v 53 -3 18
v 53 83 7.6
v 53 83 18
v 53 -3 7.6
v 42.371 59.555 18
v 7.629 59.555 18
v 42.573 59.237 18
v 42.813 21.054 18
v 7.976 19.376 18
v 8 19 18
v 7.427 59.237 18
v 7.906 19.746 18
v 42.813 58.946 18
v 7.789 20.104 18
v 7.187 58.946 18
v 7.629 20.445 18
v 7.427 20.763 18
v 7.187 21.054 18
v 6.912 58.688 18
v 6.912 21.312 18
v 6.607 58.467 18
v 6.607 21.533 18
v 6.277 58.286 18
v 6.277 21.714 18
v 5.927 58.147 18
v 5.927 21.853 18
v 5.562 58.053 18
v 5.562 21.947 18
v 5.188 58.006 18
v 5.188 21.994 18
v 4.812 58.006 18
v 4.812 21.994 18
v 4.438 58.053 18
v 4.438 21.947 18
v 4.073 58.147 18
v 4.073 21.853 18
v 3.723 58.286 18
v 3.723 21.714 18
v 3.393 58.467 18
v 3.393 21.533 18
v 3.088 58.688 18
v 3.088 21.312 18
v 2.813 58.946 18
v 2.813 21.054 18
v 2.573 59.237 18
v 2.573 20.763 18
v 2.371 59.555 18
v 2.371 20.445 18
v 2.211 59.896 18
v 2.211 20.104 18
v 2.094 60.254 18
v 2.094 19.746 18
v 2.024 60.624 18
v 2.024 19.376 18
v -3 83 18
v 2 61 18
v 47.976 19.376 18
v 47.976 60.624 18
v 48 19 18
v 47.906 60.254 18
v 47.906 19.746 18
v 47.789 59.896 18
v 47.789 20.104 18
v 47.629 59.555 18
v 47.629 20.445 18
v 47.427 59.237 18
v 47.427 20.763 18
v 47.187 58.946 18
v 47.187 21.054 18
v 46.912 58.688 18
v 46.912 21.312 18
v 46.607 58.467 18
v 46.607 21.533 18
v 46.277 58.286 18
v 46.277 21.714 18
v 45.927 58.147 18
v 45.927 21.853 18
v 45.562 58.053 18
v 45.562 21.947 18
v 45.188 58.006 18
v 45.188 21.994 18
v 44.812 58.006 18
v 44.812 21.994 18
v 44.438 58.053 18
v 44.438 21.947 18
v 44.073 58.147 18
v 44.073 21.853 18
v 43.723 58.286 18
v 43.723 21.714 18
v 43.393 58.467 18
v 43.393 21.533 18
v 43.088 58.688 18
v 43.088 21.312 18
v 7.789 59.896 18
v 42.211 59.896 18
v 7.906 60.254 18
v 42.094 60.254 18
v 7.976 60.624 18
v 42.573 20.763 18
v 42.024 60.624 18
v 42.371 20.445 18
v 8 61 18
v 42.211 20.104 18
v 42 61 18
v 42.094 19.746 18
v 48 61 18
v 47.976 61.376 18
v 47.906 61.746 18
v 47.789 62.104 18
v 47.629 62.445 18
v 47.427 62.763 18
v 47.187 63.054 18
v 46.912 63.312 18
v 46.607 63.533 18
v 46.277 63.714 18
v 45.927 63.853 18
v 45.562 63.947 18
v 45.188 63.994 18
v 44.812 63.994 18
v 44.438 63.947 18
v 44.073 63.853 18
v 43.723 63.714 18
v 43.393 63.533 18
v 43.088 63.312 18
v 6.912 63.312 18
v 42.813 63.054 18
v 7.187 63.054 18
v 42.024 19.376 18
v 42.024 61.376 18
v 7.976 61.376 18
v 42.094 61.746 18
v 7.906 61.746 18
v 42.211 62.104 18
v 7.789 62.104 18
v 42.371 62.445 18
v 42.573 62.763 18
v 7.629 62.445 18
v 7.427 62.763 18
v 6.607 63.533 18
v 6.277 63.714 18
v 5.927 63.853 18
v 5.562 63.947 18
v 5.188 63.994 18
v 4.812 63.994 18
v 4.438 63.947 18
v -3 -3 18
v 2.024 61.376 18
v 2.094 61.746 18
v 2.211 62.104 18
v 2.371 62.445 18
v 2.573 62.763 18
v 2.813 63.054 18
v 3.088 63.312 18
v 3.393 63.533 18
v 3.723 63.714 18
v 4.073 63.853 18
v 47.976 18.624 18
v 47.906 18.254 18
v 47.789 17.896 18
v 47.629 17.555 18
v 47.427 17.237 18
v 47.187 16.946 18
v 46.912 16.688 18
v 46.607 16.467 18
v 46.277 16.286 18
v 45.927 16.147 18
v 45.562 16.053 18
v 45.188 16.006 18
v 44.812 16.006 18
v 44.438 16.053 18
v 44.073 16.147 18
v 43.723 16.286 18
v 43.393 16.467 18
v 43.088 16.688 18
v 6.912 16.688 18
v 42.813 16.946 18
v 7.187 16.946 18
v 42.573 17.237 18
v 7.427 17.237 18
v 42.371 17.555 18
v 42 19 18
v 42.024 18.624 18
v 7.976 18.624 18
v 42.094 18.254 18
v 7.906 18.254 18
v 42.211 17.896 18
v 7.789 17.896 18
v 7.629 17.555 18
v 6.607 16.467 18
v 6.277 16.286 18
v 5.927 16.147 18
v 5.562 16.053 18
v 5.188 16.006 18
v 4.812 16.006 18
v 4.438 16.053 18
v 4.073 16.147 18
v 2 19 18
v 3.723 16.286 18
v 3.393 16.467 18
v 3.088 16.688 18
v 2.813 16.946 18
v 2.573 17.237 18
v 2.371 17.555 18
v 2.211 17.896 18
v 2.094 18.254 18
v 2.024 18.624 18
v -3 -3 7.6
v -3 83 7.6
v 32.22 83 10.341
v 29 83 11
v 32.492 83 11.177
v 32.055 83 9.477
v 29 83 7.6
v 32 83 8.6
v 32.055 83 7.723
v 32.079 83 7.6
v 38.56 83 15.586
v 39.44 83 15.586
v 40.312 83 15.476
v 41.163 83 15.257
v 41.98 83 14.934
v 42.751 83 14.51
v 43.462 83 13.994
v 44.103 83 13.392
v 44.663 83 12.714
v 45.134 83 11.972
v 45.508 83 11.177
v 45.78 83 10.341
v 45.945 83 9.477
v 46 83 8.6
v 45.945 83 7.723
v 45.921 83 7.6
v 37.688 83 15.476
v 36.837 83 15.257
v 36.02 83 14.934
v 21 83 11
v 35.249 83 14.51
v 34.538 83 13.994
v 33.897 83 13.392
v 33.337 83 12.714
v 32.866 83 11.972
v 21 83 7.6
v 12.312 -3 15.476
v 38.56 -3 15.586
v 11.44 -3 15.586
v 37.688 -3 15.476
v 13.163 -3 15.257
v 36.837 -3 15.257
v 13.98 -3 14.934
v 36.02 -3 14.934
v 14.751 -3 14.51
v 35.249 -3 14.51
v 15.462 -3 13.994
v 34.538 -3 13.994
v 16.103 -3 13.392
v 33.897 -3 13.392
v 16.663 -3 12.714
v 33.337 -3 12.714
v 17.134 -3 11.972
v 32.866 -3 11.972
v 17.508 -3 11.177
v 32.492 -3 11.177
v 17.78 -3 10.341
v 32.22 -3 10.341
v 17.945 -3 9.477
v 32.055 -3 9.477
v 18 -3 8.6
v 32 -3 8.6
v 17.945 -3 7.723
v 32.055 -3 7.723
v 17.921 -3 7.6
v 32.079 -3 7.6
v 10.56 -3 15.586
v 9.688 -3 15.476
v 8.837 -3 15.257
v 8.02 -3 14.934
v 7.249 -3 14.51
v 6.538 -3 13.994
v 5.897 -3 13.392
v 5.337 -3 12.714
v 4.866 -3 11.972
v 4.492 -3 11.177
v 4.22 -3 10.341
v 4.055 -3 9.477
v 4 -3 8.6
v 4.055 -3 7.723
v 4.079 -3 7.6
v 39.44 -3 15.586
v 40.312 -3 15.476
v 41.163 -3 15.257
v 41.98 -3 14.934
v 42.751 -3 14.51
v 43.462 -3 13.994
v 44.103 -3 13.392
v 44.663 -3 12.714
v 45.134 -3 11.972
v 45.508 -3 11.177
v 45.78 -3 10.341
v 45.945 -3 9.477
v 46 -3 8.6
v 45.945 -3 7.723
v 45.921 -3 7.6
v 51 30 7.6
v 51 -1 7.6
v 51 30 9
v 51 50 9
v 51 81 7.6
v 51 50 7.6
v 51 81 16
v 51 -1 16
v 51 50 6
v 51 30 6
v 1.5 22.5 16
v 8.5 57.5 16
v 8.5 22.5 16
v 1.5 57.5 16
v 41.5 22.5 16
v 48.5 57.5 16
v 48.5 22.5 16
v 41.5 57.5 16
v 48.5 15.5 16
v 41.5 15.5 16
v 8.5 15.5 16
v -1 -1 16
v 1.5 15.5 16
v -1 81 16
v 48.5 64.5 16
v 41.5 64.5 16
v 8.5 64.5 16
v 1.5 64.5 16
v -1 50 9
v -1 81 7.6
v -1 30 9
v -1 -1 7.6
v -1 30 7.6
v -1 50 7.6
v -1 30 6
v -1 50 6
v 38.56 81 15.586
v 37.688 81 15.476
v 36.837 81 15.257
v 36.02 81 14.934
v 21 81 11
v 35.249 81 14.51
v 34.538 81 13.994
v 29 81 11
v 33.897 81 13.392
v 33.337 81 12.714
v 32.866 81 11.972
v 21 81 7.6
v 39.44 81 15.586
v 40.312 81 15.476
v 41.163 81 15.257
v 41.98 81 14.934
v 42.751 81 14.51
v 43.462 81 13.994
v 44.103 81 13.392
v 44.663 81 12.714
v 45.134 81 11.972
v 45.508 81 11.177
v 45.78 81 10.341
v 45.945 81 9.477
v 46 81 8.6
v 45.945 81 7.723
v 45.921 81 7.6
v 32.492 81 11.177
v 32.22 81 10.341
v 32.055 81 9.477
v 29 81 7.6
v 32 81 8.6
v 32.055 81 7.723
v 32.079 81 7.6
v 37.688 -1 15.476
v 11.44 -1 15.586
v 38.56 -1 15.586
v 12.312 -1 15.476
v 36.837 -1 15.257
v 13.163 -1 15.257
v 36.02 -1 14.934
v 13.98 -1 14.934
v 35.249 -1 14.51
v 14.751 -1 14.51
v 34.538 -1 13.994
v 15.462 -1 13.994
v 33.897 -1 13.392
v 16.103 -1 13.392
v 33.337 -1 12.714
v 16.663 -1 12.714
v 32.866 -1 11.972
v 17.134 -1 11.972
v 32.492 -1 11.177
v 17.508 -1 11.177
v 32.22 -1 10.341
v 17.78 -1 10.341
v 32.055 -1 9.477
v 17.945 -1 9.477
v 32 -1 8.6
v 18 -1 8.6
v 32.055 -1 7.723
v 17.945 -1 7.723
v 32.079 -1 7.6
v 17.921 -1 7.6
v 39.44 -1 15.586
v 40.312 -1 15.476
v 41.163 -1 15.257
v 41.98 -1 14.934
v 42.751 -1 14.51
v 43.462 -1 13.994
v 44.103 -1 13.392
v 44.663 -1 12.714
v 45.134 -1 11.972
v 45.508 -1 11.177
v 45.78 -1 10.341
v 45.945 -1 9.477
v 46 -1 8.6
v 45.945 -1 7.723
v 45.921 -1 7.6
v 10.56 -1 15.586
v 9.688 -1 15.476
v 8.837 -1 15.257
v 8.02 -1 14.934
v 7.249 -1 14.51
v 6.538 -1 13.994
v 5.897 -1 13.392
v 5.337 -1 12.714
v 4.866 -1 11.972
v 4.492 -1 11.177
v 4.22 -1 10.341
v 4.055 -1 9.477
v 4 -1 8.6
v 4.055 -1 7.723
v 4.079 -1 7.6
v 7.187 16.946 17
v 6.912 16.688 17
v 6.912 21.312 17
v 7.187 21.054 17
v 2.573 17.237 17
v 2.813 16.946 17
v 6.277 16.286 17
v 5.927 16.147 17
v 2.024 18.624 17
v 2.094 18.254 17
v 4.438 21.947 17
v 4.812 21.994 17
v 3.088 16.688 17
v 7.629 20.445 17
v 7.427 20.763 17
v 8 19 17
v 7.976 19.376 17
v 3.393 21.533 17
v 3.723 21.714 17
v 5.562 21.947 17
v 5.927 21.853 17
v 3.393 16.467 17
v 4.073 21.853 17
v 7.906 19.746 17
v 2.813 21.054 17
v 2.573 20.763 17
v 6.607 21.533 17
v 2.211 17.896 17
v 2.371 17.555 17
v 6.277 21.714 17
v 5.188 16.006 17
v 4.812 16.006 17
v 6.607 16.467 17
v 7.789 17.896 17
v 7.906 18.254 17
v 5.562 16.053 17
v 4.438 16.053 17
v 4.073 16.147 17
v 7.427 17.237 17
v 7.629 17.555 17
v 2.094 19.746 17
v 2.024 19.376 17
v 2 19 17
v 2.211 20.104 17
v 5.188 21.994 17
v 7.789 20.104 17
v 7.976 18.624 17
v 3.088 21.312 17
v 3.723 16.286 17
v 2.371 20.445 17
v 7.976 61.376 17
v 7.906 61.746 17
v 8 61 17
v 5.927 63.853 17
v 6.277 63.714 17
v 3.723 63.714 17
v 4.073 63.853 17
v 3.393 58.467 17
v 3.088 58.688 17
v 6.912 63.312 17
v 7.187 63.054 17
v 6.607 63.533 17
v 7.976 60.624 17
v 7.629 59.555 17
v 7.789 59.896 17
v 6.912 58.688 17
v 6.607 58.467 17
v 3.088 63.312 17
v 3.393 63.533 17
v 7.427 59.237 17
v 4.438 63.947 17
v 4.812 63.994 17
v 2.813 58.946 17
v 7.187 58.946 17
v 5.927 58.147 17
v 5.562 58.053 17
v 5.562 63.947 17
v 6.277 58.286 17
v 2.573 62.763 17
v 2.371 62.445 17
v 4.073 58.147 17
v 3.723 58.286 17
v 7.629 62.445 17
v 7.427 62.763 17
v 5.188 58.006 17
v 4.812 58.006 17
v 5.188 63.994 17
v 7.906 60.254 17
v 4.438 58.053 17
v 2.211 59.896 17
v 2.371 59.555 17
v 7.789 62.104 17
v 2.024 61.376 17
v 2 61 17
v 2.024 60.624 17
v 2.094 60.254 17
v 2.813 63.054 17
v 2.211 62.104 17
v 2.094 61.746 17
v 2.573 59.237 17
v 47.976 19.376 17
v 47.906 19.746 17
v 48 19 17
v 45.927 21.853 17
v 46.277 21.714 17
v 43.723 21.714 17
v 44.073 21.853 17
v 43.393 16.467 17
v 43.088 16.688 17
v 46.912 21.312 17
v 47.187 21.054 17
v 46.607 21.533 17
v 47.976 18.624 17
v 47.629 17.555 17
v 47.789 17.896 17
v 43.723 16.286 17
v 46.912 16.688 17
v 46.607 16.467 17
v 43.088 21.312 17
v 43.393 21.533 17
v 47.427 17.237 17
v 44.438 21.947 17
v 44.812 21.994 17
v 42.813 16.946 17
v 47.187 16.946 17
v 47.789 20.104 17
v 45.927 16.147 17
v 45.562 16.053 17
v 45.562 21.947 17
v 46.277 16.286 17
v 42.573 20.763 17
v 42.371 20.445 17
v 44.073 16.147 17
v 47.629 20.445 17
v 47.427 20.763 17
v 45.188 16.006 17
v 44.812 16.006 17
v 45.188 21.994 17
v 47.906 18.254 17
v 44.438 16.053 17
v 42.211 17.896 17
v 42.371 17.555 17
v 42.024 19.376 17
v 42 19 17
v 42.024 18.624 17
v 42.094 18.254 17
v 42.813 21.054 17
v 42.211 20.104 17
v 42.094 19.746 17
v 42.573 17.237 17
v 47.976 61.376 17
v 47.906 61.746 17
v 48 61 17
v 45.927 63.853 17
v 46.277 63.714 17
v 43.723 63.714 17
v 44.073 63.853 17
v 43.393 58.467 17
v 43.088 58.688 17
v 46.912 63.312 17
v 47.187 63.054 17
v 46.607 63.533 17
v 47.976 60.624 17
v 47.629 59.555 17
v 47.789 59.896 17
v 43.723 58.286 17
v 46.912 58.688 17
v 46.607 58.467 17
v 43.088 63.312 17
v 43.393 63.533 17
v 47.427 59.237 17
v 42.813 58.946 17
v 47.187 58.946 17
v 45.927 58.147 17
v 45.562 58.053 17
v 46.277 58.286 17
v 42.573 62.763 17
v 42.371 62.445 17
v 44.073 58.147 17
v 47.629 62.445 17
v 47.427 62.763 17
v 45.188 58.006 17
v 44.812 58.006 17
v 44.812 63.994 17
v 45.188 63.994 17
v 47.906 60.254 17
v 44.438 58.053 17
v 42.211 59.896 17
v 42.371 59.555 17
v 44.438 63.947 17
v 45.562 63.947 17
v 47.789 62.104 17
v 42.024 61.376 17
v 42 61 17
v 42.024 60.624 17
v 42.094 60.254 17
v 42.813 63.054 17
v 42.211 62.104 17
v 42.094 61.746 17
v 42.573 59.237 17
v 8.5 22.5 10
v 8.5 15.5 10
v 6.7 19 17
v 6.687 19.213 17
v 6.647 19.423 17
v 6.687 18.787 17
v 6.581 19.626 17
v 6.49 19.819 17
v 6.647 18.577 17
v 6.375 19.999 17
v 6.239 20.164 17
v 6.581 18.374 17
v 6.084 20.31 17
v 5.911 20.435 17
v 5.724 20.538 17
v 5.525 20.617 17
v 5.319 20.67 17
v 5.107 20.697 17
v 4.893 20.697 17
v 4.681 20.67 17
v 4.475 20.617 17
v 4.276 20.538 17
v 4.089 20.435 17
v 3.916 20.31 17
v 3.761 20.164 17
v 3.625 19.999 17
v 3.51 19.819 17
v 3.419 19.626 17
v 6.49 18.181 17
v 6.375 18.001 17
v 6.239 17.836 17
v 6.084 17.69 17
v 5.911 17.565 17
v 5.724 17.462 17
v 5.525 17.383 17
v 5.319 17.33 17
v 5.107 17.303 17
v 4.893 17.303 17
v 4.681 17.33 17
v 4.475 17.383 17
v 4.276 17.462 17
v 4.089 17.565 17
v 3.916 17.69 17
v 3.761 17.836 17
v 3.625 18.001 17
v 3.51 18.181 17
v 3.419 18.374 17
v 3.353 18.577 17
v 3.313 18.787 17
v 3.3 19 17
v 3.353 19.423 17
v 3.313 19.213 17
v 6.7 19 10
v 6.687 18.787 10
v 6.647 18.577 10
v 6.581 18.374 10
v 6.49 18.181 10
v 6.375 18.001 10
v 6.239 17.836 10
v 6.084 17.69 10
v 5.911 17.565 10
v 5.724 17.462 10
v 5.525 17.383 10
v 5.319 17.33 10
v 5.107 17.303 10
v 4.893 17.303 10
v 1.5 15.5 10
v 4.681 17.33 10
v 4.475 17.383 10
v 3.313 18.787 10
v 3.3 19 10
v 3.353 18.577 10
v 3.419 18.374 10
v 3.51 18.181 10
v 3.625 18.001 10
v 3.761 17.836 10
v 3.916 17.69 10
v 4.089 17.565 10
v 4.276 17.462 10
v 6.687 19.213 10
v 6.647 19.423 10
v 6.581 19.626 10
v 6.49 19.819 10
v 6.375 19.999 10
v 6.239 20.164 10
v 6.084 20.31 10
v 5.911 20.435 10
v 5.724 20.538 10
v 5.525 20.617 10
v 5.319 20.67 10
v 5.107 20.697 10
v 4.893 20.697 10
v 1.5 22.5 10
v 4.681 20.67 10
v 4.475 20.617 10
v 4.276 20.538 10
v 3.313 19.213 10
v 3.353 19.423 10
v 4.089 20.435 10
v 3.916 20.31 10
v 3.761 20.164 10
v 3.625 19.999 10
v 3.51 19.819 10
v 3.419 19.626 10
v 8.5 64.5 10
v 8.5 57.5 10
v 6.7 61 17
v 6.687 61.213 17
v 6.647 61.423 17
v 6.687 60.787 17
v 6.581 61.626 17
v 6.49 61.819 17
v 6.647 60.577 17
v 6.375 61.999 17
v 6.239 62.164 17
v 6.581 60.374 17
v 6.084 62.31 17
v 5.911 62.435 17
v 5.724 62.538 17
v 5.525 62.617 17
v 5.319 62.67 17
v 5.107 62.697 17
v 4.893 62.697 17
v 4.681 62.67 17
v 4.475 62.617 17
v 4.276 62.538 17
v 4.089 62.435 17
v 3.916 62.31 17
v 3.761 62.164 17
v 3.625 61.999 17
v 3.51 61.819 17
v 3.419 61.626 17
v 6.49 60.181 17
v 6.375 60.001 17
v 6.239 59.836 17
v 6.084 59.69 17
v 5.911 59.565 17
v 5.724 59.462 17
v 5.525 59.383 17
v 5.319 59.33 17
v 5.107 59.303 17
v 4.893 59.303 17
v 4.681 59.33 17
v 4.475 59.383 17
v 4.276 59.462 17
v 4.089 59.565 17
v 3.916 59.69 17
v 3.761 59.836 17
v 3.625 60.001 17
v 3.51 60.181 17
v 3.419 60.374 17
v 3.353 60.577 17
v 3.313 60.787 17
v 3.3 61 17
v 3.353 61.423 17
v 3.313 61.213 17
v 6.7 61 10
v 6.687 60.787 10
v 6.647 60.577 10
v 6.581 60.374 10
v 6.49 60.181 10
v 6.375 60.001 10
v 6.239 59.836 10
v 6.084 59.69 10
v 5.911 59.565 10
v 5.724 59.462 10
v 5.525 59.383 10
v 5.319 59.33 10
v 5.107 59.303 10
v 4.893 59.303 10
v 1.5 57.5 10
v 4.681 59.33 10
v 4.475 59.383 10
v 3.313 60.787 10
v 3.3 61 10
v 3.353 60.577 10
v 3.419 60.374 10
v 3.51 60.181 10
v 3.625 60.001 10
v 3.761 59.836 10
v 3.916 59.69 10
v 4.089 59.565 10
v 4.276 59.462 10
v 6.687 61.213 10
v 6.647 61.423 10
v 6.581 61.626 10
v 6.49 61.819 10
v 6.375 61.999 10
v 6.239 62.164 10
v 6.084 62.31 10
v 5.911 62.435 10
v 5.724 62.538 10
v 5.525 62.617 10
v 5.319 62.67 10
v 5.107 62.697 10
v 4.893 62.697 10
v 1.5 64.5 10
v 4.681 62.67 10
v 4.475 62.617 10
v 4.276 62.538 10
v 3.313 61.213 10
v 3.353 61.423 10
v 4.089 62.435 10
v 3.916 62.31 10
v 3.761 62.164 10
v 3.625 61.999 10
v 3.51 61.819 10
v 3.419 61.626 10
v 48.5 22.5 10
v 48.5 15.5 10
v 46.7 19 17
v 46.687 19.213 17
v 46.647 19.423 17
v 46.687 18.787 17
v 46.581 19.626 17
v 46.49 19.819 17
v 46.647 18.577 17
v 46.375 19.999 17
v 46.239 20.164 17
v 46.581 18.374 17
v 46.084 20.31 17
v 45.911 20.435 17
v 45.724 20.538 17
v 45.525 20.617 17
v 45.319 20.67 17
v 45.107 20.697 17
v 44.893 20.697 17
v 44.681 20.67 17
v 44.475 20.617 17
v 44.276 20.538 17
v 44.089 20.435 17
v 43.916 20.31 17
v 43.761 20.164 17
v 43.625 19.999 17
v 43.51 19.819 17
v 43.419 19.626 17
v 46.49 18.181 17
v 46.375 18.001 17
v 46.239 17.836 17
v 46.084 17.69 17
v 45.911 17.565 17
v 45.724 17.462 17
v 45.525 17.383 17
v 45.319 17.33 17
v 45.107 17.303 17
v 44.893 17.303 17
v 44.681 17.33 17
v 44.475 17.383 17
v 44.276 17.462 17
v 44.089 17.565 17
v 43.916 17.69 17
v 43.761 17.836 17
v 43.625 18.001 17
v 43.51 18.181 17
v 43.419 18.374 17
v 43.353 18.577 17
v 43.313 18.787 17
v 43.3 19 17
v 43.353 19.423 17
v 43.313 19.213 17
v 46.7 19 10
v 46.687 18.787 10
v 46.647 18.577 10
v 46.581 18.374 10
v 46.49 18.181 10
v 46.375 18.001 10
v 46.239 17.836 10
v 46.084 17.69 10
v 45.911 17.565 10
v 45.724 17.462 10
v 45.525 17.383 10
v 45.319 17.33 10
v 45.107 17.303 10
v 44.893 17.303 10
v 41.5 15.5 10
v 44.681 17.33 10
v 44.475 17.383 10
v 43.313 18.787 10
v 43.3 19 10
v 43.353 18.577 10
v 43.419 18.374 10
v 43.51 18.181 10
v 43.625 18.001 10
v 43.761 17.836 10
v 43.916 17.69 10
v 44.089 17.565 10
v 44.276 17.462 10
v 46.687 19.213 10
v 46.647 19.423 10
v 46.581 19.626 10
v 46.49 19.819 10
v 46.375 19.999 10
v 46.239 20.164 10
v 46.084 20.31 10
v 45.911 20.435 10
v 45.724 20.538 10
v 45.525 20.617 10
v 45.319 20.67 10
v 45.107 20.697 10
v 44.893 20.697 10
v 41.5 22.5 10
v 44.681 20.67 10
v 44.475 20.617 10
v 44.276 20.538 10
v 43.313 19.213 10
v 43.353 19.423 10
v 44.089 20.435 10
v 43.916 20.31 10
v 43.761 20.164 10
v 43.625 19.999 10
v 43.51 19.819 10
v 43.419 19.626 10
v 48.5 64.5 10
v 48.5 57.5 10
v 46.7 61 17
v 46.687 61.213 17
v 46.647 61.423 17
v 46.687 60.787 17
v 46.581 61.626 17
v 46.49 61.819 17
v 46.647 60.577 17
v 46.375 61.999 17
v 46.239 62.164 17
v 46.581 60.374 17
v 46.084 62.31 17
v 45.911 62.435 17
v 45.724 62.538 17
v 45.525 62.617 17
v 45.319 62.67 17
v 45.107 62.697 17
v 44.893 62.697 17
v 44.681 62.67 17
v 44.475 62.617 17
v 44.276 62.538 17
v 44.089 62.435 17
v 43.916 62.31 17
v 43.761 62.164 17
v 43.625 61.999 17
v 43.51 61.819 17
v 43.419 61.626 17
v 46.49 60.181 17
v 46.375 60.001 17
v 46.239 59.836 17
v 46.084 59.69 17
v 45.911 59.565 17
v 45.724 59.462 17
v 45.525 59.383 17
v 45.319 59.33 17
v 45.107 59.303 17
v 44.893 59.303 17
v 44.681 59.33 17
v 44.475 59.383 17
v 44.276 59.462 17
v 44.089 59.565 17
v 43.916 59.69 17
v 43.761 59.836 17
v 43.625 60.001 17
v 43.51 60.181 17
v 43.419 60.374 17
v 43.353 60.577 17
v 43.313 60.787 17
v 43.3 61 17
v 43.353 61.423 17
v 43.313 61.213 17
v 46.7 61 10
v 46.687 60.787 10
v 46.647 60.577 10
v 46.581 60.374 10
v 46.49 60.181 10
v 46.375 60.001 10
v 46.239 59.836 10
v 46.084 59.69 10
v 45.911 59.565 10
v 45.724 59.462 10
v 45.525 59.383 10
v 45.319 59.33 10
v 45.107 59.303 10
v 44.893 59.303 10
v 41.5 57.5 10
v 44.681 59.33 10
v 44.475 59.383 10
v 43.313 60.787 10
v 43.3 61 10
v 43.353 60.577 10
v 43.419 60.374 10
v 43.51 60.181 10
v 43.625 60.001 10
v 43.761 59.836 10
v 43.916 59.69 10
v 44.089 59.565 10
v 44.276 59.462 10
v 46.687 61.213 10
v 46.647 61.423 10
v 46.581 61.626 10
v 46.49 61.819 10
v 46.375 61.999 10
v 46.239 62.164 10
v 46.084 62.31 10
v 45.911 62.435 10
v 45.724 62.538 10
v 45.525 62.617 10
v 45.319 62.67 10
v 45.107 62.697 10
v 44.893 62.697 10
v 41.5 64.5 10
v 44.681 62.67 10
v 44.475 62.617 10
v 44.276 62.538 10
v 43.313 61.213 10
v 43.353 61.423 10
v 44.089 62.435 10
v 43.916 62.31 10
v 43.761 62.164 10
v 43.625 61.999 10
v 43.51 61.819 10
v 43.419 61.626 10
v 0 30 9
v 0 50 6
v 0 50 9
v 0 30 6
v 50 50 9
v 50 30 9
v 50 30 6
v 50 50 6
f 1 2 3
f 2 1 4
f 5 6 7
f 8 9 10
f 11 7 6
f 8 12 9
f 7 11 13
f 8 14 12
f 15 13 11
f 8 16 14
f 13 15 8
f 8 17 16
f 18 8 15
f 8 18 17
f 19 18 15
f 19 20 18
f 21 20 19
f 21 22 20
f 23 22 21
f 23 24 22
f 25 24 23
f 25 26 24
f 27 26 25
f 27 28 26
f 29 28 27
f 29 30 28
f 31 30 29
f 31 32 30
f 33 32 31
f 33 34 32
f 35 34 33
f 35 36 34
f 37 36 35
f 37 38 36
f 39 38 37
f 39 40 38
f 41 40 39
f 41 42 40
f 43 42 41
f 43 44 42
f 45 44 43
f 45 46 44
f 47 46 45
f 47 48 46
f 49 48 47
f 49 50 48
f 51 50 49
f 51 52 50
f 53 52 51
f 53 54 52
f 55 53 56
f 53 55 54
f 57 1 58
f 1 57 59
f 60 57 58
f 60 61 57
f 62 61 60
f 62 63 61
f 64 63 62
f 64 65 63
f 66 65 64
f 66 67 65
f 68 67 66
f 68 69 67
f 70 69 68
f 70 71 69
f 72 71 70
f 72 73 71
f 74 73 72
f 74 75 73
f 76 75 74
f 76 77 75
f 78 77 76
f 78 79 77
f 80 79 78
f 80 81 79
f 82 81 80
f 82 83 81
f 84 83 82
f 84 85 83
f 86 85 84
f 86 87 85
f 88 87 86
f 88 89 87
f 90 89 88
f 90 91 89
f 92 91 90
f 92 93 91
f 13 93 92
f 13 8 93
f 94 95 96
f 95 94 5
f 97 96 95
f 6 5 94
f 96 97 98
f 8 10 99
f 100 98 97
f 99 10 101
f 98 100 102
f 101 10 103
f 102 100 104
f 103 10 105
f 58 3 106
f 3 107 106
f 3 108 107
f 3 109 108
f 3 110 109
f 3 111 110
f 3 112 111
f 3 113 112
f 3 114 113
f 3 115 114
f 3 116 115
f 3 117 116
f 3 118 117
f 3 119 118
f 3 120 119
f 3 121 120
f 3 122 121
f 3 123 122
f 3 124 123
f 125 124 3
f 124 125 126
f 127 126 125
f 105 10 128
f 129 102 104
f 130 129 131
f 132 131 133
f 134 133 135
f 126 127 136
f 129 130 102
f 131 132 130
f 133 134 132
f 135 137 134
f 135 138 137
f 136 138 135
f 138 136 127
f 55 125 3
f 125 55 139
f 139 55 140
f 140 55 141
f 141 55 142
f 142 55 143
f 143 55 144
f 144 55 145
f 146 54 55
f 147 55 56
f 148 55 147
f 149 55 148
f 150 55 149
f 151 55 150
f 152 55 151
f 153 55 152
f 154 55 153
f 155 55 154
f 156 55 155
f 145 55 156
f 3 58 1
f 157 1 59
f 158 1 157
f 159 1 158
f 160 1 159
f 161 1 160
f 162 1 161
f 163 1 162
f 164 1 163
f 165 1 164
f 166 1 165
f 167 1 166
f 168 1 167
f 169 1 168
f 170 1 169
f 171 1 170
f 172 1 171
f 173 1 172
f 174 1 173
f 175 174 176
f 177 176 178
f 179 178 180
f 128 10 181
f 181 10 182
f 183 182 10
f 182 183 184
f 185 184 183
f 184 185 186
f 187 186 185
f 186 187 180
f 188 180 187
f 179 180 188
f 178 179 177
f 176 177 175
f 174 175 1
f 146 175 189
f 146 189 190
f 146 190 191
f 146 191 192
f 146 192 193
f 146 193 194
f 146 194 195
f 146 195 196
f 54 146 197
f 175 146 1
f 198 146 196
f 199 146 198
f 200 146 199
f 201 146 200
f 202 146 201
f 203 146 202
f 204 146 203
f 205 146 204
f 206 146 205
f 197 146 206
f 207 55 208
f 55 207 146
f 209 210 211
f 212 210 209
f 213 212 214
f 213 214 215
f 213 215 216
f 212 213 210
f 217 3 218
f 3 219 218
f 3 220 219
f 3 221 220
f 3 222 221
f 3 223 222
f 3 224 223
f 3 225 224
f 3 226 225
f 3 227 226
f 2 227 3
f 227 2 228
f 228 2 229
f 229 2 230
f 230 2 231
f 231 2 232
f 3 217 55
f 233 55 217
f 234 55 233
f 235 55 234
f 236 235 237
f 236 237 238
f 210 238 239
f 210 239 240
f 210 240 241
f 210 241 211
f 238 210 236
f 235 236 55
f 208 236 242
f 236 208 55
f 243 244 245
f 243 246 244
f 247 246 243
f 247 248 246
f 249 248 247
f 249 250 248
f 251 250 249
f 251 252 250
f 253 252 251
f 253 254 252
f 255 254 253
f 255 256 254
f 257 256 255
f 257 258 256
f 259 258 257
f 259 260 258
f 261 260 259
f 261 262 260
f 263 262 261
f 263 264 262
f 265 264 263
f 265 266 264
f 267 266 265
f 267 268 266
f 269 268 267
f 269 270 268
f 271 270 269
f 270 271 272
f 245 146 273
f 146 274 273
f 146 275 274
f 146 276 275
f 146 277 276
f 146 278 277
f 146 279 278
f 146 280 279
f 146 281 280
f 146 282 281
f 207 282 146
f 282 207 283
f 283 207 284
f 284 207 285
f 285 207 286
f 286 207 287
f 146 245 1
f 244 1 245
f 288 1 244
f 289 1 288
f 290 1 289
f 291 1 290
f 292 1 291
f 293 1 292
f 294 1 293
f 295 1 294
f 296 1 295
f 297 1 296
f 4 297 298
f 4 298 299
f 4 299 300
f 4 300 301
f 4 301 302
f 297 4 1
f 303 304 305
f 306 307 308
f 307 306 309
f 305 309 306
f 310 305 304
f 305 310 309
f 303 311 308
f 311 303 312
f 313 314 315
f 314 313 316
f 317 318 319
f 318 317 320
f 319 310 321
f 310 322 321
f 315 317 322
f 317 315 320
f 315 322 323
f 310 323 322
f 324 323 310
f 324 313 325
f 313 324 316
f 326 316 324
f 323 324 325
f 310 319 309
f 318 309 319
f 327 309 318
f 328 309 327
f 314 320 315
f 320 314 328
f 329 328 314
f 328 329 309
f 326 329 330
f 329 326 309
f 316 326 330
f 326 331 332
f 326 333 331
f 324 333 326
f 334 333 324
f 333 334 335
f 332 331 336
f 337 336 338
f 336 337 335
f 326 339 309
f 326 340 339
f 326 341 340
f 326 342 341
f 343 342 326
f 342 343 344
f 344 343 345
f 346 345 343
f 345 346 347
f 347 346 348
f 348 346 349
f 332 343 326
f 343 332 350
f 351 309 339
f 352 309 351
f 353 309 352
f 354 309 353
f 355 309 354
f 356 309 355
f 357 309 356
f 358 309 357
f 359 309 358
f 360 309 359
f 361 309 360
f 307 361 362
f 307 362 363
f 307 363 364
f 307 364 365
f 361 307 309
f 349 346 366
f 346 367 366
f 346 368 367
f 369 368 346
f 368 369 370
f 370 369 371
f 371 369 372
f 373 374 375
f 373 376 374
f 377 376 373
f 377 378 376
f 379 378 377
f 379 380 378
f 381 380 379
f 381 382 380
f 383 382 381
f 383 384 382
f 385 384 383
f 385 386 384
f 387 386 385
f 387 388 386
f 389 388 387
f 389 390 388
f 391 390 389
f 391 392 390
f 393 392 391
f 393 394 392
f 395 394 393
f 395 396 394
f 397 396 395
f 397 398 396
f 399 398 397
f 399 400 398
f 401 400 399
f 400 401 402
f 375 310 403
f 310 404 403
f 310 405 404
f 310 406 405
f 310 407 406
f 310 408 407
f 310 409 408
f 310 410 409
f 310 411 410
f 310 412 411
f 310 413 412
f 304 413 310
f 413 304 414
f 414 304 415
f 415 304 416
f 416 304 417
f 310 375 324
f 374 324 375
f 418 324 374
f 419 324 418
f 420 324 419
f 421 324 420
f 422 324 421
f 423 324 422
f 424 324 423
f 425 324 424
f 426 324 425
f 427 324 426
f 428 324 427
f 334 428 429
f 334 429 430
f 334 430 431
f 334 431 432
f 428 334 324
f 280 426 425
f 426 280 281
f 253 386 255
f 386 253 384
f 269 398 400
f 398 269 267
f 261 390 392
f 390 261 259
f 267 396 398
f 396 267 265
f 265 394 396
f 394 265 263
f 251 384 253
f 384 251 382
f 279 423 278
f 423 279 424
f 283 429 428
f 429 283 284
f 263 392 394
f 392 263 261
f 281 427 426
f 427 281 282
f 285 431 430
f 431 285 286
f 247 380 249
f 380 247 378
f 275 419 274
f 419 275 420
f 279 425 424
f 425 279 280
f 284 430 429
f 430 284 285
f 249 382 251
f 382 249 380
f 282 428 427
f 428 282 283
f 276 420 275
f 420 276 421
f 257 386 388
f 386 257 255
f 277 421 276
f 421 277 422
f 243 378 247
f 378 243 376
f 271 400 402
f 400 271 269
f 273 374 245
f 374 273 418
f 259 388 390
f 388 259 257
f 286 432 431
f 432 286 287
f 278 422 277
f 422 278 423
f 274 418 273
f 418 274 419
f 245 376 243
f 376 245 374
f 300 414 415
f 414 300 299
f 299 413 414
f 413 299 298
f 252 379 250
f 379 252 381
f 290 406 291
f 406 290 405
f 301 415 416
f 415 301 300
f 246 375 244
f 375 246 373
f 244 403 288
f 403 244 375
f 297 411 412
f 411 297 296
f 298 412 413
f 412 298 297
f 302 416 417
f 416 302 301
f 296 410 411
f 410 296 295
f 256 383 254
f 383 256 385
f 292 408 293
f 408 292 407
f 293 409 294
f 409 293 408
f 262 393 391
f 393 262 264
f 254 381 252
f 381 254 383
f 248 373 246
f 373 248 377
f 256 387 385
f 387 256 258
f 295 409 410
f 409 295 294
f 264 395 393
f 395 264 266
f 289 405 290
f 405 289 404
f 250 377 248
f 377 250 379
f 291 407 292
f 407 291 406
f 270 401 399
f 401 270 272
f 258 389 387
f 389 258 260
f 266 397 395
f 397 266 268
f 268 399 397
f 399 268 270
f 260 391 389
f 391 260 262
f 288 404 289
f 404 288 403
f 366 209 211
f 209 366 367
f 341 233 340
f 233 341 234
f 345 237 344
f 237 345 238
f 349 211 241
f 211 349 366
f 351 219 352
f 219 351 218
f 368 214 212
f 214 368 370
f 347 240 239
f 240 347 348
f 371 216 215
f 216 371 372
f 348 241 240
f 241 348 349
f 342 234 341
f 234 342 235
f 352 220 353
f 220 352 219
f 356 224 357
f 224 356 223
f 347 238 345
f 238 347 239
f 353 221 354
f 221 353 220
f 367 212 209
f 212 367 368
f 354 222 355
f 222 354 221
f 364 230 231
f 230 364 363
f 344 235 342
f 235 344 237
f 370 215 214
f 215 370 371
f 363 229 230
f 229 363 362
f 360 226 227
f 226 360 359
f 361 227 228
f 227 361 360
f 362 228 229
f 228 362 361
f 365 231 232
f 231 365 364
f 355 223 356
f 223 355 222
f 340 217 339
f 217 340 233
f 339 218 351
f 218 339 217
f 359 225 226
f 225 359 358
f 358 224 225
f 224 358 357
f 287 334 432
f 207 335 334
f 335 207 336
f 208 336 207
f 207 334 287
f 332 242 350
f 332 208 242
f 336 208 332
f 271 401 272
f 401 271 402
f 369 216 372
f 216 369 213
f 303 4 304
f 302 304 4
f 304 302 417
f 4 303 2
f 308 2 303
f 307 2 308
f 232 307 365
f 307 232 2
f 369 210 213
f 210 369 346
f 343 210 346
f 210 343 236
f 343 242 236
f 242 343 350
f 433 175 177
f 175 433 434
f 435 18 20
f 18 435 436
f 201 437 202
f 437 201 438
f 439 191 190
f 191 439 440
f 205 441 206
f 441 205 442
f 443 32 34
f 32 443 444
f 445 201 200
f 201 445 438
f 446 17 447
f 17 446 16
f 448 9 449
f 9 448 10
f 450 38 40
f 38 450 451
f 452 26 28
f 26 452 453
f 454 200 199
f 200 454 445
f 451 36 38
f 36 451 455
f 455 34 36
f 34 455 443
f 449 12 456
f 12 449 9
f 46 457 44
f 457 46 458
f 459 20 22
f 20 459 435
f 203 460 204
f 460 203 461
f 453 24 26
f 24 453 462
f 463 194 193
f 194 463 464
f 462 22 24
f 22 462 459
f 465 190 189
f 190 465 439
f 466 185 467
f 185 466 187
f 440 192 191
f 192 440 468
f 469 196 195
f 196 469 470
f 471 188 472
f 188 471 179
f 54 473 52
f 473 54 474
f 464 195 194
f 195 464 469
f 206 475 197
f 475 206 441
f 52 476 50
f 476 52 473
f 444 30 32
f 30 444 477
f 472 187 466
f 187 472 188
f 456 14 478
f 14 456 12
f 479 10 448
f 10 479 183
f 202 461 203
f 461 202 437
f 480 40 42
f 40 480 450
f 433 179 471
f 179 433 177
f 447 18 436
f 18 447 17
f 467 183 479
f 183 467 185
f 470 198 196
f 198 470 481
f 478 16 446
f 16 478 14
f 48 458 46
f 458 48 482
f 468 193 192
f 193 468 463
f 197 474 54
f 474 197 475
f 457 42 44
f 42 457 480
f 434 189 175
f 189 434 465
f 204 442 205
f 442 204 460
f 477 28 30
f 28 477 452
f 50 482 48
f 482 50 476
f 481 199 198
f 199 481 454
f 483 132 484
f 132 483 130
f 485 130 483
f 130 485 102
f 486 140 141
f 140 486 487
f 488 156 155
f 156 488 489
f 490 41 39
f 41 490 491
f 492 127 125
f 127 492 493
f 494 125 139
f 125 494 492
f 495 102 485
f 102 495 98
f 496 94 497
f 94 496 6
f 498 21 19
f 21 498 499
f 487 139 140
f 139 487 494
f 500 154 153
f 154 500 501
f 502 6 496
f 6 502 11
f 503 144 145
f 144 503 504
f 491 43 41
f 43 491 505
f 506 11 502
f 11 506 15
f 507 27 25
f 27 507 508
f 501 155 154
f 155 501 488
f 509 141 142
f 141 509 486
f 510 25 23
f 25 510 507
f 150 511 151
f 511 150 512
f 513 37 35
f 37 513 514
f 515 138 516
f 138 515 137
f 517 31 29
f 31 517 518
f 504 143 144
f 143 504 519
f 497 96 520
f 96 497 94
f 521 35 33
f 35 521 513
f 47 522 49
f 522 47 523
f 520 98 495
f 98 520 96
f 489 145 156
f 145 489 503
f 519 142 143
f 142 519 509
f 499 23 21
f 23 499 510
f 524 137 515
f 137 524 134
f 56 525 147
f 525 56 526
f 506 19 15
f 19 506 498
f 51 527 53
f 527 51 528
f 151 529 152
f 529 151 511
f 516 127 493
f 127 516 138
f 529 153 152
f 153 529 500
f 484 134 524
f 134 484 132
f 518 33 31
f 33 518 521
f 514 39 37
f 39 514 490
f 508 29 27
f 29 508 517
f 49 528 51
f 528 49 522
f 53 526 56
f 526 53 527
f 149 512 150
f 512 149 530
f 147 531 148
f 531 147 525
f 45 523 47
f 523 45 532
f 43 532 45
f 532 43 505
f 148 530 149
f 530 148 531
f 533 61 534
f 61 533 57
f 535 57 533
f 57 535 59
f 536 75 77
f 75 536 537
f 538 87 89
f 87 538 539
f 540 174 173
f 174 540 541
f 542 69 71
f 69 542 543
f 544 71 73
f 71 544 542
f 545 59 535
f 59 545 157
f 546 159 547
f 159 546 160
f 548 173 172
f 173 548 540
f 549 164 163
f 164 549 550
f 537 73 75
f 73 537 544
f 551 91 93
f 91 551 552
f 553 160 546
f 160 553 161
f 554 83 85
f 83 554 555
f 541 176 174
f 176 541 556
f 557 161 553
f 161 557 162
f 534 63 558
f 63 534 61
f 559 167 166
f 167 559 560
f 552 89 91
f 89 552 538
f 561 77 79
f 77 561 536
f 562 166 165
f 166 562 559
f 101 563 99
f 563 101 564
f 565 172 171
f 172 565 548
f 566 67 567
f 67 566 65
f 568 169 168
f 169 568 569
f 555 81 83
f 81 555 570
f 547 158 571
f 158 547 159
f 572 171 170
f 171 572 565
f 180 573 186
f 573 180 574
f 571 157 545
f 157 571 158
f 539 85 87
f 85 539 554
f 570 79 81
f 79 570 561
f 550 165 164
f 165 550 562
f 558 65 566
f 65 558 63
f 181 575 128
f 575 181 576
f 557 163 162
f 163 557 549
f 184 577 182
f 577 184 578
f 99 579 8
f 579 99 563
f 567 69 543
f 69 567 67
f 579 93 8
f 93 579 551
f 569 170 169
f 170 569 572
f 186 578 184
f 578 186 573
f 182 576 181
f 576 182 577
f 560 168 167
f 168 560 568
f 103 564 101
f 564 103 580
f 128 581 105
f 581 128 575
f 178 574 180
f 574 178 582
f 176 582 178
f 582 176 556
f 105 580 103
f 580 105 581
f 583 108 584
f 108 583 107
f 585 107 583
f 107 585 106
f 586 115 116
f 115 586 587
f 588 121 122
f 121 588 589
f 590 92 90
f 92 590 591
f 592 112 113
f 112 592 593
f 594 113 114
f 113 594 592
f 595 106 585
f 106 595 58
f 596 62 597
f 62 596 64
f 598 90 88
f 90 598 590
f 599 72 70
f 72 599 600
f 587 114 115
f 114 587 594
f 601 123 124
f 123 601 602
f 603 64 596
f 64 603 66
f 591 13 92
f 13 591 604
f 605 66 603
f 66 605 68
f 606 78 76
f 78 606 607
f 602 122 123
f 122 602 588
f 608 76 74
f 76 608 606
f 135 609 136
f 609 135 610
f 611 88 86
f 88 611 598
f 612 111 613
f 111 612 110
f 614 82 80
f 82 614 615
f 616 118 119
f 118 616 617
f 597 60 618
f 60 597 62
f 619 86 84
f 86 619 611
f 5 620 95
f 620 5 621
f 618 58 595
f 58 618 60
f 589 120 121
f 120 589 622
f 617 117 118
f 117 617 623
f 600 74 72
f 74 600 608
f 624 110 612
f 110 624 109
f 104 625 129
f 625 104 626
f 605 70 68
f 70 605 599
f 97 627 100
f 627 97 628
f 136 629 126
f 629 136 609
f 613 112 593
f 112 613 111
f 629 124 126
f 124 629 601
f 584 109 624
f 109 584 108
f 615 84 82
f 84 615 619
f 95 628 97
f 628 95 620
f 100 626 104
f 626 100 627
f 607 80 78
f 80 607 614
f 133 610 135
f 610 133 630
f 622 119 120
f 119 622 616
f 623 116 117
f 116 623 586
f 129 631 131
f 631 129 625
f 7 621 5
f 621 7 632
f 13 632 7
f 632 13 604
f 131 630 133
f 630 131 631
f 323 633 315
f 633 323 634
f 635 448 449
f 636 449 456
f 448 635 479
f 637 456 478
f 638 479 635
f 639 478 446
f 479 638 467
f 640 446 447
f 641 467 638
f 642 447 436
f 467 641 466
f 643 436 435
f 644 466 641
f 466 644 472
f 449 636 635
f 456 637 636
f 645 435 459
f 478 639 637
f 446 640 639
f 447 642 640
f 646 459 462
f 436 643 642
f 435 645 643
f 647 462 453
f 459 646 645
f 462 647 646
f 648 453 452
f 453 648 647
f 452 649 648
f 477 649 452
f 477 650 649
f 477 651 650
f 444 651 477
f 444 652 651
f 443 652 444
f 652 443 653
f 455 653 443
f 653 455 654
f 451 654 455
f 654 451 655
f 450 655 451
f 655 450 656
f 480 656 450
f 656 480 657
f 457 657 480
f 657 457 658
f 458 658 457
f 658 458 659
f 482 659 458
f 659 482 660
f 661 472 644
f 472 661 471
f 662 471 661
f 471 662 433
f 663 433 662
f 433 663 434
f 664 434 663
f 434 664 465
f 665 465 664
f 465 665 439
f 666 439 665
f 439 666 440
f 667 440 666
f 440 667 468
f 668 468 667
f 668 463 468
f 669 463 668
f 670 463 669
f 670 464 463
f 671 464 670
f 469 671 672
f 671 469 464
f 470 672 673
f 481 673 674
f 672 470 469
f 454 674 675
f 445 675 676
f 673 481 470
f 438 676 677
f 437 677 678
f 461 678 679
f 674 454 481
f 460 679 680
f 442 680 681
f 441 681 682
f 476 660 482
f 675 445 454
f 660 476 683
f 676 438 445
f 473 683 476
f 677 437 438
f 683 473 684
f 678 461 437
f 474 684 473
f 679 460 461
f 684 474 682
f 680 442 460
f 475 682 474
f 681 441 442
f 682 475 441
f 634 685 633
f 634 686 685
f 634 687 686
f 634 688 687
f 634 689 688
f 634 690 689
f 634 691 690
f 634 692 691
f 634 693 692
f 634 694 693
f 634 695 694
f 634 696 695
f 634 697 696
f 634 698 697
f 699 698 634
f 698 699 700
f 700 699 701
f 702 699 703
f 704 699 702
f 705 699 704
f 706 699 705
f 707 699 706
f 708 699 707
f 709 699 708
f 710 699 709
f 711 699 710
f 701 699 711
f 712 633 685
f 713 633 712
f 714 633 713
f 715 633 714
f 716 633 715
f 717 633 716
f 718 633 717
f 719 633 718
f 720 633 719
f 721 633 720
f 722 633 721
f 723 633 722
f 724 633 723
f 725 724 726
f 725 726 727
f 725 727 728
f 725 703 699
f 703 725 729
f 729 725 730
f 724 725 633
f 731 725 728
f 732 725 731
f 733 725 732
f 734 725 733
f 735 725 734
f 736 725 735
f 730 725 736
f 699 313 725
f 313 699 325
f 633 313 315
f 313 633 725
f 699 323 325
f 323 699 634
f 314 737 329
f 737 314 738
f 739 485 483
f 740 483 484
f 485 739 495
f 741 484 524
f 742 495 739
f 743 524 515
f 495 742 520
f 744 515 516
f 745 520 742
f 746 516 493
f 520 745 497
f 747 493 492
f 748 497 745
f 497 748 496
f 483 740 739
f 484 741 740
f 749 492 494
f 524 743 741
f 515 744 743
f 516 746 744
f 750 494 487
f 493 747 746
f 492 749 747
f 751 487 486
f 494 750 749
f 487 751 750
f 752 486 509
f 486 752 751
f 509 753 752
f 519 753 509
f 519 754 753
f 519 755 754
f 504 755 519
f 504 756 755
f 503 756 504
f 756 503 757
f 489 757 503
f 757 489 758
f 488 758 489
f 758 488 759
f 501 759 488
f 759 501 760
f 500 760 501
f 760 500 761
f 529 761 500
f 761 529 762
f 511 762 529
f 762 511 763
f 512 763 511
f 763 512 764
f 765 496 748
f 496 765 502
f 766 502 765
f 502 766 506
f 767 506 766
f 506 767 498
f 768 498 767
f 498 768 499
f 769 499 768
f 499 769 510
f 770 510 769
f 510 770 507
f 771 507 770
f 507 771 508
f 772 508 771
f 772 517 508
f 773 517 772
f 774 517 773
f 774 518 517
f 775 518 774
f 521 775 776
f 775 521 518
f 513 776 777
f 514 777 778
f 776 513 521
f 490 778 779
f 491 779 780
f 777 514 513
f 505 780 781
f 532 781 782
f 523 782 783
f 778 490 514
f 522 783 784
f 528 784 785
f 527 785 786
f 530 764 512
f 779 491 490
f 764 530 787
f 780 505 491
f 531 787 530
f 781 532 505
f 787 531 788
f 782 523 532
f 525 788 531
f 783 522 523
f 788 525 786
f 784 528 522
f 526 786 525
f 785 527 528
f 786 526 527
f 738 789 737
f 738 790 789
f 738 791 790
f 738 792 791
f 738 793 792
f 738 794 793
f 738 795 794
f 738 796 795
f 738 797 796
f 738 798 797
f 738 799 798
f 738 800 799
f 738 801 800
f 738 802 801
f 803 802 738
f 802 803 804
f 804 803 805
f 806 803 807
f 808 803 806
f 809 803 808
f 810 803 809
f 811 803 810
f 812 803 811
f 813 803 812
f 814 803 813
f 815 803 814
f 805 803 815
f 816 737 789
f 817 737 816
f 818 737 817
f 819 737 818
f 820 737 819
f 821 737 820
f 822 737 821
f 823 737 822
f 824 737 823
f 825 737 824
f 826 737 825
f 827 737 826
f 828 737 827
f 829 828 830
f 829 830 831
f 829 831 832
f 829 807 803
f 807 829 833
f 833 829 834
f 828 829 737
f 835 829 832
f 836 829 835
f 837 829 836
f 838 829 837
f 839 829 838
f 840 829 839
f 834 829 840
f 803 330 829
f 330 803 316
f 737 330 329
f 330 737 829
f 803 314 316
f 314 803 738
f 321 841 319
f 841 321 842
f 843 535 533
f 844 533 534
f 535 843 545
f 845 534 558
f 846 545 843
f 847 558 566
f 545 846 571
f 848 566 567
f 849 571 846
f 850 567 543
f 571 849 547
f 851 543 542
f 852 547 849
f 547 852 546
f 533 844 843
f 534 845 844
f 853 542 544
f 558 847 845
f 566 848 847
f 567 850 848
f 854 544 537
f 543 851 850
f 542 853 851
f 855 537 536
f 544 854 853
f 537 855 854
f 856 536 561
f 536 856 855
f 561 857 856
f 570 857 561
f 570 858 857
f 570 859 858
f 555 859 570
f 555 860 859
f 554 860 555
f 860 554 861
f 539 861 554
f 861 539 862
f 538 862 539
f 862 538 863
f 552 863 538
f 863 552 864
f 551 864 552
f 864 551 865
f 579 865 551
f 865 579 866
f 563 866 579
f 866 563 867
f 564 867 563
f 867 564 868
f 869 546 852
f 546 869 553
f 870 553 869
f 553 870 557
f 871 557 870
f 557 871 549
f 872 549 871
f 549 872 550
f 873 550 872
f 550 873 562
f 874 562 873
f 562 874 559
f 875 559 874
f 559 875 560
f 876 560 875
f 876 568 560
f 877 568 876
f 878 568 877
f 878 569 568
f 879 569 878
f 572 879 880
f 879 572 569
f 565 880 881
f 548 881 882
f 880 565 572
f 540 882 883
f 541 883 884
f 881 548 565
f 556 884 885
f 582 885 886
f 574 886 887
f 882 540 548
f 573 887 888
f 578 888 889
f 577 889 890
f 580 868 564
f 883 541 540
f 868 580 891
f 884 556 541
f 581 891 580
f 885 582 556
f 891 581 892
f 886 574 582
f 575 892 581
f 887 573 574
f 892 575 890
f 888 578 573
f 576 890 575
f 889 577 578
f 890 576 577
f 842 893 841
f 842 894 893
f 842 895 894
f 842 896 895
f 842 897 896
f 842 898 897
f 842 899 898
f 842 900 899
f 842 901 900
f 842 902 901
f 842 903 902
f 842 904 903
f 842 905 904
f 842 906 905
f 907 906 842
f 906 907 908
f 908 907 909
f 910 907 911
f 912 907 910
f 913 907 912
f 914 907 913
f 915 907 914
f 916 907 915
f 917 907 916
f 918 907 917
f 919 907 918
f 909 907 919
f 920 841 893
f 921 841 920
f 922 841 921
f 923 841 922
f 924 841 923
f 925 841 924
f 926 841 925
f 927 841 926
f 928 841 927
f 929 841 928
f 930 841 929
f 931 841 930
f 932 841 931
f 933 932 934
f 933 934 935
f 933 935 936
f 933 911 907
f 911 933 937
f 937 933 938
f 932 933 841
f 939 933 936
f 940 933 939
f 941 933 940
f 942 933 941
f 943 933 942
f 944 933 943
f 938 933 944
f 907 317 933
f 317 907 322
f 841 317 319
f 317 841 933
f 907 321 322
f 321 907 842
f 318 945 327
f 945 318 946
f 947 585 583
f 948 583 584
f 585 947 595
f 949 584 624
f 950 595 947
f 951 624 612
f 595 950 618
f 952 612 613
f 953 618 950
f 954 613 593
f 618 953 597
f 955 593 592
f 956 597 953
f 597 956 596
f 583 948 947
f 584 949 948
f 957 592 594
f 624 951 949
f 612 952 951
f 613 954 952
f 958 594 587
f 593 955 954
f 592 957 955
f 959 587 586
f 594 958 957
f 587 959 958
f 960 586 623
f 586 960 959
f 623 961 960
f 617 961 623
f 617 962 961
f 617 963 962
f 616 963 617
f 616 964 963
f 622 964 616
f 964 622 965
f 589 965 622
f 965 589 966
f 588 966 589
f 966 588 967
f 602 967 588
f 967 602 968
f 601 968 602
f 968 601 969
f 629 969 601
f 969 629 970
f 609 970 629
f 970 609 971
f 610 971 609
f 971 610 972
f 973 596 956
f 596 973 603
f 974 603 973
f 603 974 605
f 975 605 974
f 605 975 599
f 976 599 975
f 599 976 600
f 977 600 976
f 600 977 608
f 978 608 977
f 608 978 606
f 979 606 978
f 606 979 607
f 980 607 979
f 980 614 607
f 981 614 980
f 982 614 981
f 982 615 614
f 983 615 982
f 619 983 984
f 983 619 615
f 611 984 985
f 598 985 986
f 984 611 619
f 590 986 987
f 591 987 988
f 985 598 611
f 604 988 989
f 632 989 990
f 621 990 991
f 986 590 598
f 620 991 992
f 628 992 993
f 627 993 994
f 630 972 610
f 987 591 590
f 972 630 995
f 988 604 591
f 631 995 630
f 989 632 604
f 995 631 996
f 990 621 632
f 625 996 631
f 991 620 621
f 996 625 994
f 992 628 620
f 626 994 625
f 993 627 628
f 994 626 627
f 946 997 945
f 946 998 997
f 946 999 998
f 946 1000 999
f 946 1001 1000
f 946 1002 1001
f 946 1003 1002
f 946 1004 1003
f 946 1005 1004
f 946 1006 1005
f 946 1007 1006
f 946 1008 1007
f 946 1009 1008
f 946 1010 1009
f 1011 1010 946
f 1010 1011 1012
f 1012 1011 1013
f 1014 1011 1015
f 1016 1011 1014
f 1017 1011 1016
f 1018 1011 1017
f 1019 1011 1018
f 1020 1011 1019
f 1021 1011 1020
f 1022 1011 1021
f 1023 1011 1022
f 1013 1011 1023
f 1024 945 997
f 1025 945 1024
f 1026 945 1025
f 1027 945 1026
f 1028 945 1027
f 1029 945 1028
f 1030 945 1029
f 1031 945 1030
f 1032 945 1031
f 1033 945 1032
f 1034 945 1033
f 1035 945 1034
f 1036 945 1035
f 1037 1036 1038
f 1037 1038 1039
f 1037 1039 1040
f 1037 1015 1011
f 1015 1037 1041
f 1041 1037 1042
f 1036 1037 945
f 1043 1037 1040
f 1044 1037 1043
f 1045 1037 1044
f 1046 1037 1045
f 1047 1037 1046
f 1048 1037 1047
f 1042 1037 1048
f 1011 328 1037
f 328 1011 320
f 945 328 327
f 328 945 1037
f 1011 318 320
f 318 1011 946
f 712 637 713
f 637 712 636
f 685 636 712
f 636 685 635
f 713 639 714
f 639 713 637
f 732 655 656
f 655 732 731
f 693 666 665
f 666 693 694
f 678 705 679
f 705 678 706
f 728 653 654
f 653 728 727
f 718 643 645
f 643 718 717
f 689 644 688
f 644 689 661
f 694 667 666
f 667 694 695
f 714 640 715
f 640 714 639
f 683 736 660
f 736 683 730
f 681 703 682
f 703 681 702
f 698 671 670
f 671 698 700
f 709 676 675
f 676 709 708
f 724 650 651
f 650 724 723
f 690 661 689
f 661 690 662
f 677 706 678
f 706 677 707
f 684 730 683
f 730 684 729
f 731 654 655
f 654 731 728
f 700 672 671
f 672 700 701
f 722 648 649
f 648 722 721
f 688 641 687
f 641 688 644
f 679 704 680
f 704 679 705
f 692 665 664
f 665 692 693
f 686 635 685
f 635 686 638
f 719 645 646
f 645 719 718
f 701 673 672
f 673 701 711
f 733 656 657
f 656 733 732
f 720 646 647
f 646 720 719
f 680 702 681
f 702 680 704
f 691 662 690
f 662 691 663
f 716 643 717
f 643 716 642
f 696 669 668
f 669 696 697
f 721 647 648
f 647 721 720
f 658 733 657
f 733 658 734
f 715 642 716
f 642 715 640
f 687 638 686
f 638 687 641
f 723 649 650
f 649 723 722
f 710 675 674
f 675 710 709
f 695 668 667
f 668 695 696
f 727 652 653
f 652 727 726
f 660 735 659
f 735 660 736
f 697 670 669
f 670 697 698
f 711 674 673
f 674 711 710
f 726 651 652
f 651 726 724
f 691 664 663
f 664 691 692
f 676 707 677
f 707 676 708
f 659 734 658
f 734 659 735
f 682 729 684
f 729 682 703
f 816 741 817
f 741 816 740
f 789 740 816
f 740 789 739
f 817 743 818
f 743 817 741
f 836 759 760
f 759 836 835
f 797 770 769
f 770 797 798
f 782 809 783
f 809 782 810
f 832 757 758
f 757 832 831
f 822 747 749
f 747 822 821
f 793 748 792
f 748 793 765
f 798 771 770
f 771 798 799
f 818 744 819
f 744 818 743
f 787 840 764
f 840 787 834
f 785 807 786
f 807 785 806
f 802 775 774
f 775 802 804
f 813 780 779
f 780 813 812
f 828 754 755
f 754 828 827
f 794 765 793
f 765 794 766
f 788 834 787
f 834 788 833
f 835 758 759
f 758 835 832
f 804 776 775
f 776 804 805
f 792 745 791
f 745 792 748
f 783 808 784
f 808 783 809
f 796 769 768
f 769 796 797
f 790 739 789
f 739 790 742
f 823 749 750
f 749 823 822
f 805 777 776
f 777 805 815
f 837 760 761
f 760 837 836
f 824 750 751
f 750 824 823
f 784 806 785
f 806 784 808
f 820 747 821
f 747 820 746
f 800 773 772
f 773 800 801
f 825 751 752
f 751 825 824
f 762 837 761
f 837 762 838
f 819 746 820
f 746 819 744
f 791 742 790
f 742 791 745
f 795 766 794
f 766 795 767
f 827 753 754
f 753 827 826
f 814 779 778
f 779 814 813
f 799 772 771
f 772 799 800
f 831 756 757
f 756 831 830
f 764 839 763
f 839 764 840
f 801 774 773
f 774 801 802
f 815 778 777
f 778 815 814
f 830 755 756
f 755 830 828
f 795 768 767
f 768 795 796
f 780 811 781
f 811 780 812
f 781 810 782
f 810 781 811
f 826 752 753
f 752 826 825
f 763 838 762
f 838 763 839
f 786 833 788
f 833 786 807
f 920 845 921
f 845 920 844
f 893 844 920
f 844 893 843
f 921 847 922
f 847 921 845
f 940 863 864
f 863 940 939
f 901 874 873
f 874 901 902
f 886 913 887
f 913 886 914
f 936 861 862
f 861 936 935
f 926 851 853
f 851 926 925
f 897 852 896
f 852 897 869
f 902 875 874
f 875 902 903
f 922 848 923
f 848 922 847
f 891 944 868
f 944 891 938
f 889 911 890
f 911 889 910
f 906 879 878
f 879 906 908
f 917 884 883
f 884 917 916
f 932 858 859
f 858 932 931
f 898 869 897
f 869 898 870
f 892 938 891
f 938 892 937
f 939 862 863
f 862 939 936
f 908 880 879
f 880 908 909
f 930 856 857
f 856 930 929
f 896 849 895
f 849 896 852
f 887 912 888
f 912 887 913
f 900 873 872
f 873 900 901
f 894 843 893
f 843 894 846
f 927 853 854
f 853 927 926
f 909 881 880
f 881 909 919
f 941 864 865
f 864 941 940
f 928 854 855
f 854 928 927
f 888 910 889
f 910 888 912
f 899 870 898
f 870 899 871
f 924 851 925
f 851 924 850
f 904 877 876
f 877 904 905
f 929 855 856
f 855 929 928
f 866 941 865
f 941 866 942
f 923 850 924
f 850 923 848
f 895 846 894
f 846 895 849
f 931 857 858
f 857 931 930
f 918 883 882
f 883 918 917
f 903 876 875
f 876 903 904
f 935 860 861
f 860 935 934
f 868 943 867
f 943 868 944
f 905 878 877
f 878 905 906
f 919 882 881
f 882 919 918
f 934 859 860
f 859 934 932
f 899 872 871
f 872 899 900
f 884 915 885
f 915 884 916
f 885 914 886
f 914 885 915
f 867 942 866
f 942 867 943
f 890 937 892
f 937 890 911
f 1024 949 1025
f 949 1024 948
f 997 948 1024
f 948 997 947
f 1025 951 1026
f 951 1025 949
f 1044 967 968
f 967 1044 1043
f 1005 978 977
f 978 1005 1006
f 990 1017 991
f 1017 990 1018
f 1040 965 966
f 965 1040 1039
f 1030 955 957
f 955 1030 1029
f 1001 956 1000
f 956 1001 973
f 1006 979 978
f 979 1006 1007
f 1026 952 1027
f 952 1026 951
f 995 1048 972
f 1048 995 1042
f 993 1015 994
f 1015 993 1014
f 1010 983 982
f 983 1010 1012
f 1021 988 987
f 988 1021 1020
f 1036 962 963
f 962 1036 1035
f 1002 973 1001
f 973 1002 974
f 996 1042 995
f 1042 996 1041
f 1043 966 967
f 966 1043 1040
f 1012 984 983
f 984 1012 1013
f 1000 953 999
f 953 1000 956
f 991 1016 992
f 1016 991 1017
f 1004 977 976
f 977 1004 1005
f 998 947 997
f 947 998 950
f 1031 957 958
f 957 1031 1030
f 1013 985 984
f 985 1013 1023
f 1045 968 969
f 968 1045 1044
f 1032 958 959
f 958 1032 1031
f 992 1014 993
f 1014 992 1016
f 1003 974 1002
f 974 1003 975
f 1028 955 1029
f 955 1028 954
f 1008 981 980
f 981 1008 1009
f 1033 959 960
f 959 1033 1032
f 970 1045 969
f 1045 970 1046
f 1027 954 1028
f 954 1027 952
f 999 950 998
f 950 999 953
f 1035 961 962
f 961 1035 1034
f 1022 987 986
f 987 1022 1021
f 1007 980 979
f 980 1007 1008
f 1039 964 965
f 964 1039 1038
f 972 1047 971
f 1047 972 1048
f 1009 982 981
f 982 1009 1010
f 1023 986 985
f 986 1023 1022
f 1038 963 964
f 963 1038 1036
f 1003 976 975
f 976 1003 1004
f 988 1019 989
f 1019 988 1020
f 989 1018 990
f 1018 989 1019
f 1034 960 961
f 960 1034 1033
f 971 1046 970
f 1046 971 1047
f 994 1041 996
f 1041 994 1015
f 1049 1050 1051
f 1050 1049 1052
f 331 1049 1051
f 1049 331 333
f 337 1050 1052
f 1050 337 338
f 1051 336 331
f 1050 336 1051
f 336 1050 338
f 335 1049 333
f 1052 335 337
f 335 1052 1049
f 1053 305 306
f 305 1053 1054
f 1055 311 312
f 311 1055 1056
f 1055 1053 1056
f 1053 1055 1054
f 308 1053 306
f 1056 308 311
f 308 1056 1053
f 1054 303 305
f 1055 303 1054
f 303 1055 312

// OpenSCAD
// Rev 1.1
// 

// Choose which half you want to render
top = true;

$fn = 50;

// Bounding box for PCB without the BNC-barrels
*cube([50,80,15]);

difference()
{
    // Bounding box extended by 3mm
    translate([-3,-3,-2])
    cube([56,86,20]);
    
    // Bounding Box extended by 1mm (results in 2mm wall)
    translate([-1,-1,-1])
    cube([52,82,17]);
    
    // BNC In
    translate([11,6,8.6])
    rotate([90,0,0])
    cylinder(h=20,d=14);
    
    // BNC Out
    translate([39,6,8.6])
    rotate([90,0,0])
    cylinder(h=20,d=14);
    
    // BNC Aux
    translate([39,74,8.6])
    rotate([90,0,180])
    cylinder(h=20,d=14);
    
    // USB Jack
    translate([6.5,75,1])
    cube([11,12,6.6]);
    
    // Reset button
    translate([21,75,3])
    cube([8,10,8]);
    
    // Bottom Screws
    screwdia=3.4;    // M3 screw
    
    translate([5,19,-5])
    cylinder(d=screwdia,h=10);
    
    translate([5,61,-5])
    cylinder(d=screwdia,h=10);
    
    translate([45,19,-5])
    cylinder(d=screwdia,h=10);
    
    translate([45,61,-5])
    cylinder(d=screwdia,h=10);
    
    // Top Nuts
    nutdia=6;    // M3 screw
    
    translate([5,19,16])
    cylinder(d=nutdia,h=10);
    
    translate([5,61,16])
    cylinder(d=nutdia,h=10);
    
    translate([45,19,16])
    cylinder(d=nutdia,h=10);
    
    translate([45,61,16])
    cylinder(d=nutdia,h=10);
    
    // Top half
    if(top)
    {
        translate([-5,-5,7.6])
        rotate([180,0,90])
        cube(100);
    }
    
    // Bottom half
    if(top != true)
    {
        translate([-5,-5,7.6])
        cube(100);
    }

}

//// Top Screws
if(top)
{
    difference()
    {
        union()
        {
            translate([5,19,13.5])
            cube(7, center=true);
            
            translate([5,61,13.5])
            cube(7, center=true);
            
            translate([45,19,13.5])
            cube(7, center=true);
            
            translate([45,61,13.5])
            cube(7, center=true);
        }


        screwdia = 3.4;
        translate([5,19,7])
        cylinder(d=screwdia,h=10);

        translate([5,61,7])
        cylinder(d=screwdia,h=10);

        translate([45,19,7])
        cylinder(d=screwdia,h=10);

        translate([45,61,7])
        cylinder(d=screwdia,h=10);
    }

    //Alignment tabs
    translate([-1, 30, 6])
    cube([1,20,3]);
    translate([50, 30, 6])
    cube([1,20,3]);
}
